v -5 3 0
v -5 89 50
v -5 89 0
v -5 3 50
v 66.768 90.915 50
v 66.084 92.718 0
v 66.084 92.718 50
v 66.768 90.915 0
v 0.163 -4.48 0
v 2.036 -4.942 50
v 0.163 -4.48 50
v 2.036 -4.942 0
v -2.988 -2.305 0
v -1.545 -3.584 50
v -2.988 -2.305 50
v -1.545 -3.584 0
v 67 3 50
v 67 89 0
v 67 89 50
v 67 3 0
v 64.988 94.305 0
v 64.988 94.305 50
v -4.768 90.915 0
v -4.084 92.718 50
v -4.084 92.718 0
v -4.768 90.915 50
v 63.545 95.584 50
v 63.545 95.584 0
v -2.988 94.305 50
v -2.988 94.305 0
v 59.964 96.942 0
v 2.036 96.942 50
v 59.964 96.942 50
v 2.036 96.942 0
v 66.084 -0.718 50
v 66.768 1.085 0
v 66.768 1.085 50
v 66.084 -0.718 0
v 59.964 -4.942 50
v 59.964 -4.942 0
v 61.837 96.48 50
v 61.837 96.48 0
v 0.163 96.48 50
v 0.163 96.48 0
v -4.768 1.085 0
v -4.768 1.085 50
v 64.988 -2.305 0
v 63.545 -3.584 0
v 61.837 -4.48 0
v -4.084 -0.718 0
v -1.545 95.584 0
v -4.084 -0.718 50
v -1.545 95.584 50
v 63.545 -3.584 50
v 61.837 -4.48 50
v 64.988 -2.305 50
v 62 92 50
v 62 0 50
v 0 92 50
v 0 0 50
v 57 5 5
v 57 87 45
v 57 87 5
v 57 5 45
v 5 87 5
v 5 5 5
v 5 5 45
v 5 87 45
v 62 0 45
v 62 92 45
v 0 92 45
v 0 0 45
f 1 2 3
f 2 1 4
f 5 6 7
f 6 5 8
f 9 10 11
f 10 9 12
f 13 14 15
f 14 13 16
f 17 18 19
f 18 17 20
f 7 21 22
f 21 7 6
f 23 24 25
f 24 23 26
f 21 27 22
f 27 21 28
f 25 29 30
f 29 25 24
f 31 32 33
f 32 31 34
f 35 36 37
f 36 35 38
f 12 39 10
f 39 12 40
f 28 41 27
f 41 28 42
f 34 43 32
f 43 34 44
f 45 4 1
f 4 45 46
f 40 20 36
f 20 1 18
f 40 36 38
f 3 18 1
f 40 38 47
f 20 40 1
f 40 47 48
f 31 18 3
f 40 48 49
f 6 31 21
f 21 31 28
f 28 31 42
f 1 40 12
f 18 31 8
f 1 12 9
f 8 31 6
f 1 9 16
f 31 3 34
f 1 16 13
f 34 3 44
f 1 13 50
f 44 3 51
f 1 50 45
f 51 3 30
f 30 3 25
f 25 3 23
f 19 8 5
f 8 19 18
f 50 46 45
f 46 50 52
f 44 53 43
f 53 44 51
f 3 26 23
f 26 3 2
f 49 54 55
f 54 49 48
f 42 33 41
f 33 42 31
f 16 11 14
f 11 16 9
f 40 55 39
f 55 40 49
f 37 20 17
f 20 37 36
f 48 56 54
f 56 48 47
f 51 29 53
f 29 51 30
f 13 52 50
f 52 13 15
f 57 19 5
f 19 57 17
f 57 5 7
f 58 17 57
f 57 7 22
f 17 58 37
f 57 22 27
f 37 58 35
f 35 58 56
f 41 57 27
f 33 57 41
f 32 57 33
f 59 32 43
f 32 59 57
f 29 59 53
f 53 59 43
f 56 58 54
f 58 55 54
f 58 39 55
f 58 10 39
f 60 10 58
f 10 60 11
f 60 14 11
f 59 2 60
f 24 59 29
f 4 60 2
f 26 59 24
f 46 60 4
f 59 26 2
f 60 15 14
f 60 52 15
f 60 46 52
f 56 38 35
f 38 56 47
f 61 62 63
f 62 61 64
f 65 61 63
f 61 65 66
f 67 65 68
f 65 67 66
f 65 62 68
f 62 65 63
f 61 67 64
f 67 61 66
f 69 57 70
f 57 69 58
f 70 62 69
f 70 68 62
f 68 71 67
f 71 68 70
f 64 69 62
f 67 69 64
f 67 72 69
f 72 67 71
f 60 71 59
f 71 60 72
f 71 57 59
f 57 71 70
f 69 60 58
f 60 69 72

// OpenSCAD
// file: open_box.scad
/////////////////////////////////////////////////////////////////////////////////
// Module for a open box with rounded edges.
//
// Author: 		Maximilian Stiefel
// Last modification: 	26.04.3017
/////////////////////////////////////////////////////////////////////////////////

module open_box(width, length, height, thickness, allowance)
{

	/////////////////////////////////////////////////////////////////////////
	// Vars
	/////////////////////////////////////////////////////////////////////////
	edge_rounding = 8;
	compensation = abs(thickness-edge_rounding);

	/////////////////////////////////////////////////////////////////////////
	// Action
	/////////////////////////////////////////////////////////////////////////
	difference(){
		
		// Hull 4 cylinders which are compensated against the thickness
		// so the actual desired thickness and edge rounding is always achieved.
		hull(){
			translate([+compensation, +compensation, 0])
				cylinder(r = edge_rounding, h = height + thickness);
			translate([width + 2*allowance + 2*thickness - compensation, compensation, 0])
				cylinder(r = edge_rounding, h = height + thickness);
			translate([compensation, length + 2*allowance + 2*thickness - compensation,0])
				cylinder(r = edge_rounding, h = height + thickness);
			translate([width + 2*allowance + 2*thickness - compensation, length + 2*allowance + 2*thickness - compensation,0])
				cylinder(r = edge_rounding, h = height + thickness);
		}

		translate([thickness, thickness, thickness])
			cube([width + 2*allowance, length + 2*allowance, height + 1]);
	}
}
// main file
/////////////////////////////////////////////////////////////////////////////////
// Housing box for UppSense first tries.
//
// Author:              Maximilian Stiefel
// Last modification:   26.04.3017
/////////////////////////////////////////////////////////////////////////////////

use <open_box.scad>

/////////////////////////////////////////////////////////////////////////////////
// Vars
/////////////////////////////////////////////////////////////////////////////////
length = 50; 
width = 80;
height = 45;
thickness = 5;
allowance = 1;
lid_depth = 5;

difference(){
	// Using my open box module for creating a simple box 
	open_box(length, width, height, thickness, allowance);
	// Creating a depening for the lid
	translate([0, 0, height])
		cube([length + 2*allowance + 2*thickness, width + 2*allowance + 2*thickness, lid_depth]);
}
